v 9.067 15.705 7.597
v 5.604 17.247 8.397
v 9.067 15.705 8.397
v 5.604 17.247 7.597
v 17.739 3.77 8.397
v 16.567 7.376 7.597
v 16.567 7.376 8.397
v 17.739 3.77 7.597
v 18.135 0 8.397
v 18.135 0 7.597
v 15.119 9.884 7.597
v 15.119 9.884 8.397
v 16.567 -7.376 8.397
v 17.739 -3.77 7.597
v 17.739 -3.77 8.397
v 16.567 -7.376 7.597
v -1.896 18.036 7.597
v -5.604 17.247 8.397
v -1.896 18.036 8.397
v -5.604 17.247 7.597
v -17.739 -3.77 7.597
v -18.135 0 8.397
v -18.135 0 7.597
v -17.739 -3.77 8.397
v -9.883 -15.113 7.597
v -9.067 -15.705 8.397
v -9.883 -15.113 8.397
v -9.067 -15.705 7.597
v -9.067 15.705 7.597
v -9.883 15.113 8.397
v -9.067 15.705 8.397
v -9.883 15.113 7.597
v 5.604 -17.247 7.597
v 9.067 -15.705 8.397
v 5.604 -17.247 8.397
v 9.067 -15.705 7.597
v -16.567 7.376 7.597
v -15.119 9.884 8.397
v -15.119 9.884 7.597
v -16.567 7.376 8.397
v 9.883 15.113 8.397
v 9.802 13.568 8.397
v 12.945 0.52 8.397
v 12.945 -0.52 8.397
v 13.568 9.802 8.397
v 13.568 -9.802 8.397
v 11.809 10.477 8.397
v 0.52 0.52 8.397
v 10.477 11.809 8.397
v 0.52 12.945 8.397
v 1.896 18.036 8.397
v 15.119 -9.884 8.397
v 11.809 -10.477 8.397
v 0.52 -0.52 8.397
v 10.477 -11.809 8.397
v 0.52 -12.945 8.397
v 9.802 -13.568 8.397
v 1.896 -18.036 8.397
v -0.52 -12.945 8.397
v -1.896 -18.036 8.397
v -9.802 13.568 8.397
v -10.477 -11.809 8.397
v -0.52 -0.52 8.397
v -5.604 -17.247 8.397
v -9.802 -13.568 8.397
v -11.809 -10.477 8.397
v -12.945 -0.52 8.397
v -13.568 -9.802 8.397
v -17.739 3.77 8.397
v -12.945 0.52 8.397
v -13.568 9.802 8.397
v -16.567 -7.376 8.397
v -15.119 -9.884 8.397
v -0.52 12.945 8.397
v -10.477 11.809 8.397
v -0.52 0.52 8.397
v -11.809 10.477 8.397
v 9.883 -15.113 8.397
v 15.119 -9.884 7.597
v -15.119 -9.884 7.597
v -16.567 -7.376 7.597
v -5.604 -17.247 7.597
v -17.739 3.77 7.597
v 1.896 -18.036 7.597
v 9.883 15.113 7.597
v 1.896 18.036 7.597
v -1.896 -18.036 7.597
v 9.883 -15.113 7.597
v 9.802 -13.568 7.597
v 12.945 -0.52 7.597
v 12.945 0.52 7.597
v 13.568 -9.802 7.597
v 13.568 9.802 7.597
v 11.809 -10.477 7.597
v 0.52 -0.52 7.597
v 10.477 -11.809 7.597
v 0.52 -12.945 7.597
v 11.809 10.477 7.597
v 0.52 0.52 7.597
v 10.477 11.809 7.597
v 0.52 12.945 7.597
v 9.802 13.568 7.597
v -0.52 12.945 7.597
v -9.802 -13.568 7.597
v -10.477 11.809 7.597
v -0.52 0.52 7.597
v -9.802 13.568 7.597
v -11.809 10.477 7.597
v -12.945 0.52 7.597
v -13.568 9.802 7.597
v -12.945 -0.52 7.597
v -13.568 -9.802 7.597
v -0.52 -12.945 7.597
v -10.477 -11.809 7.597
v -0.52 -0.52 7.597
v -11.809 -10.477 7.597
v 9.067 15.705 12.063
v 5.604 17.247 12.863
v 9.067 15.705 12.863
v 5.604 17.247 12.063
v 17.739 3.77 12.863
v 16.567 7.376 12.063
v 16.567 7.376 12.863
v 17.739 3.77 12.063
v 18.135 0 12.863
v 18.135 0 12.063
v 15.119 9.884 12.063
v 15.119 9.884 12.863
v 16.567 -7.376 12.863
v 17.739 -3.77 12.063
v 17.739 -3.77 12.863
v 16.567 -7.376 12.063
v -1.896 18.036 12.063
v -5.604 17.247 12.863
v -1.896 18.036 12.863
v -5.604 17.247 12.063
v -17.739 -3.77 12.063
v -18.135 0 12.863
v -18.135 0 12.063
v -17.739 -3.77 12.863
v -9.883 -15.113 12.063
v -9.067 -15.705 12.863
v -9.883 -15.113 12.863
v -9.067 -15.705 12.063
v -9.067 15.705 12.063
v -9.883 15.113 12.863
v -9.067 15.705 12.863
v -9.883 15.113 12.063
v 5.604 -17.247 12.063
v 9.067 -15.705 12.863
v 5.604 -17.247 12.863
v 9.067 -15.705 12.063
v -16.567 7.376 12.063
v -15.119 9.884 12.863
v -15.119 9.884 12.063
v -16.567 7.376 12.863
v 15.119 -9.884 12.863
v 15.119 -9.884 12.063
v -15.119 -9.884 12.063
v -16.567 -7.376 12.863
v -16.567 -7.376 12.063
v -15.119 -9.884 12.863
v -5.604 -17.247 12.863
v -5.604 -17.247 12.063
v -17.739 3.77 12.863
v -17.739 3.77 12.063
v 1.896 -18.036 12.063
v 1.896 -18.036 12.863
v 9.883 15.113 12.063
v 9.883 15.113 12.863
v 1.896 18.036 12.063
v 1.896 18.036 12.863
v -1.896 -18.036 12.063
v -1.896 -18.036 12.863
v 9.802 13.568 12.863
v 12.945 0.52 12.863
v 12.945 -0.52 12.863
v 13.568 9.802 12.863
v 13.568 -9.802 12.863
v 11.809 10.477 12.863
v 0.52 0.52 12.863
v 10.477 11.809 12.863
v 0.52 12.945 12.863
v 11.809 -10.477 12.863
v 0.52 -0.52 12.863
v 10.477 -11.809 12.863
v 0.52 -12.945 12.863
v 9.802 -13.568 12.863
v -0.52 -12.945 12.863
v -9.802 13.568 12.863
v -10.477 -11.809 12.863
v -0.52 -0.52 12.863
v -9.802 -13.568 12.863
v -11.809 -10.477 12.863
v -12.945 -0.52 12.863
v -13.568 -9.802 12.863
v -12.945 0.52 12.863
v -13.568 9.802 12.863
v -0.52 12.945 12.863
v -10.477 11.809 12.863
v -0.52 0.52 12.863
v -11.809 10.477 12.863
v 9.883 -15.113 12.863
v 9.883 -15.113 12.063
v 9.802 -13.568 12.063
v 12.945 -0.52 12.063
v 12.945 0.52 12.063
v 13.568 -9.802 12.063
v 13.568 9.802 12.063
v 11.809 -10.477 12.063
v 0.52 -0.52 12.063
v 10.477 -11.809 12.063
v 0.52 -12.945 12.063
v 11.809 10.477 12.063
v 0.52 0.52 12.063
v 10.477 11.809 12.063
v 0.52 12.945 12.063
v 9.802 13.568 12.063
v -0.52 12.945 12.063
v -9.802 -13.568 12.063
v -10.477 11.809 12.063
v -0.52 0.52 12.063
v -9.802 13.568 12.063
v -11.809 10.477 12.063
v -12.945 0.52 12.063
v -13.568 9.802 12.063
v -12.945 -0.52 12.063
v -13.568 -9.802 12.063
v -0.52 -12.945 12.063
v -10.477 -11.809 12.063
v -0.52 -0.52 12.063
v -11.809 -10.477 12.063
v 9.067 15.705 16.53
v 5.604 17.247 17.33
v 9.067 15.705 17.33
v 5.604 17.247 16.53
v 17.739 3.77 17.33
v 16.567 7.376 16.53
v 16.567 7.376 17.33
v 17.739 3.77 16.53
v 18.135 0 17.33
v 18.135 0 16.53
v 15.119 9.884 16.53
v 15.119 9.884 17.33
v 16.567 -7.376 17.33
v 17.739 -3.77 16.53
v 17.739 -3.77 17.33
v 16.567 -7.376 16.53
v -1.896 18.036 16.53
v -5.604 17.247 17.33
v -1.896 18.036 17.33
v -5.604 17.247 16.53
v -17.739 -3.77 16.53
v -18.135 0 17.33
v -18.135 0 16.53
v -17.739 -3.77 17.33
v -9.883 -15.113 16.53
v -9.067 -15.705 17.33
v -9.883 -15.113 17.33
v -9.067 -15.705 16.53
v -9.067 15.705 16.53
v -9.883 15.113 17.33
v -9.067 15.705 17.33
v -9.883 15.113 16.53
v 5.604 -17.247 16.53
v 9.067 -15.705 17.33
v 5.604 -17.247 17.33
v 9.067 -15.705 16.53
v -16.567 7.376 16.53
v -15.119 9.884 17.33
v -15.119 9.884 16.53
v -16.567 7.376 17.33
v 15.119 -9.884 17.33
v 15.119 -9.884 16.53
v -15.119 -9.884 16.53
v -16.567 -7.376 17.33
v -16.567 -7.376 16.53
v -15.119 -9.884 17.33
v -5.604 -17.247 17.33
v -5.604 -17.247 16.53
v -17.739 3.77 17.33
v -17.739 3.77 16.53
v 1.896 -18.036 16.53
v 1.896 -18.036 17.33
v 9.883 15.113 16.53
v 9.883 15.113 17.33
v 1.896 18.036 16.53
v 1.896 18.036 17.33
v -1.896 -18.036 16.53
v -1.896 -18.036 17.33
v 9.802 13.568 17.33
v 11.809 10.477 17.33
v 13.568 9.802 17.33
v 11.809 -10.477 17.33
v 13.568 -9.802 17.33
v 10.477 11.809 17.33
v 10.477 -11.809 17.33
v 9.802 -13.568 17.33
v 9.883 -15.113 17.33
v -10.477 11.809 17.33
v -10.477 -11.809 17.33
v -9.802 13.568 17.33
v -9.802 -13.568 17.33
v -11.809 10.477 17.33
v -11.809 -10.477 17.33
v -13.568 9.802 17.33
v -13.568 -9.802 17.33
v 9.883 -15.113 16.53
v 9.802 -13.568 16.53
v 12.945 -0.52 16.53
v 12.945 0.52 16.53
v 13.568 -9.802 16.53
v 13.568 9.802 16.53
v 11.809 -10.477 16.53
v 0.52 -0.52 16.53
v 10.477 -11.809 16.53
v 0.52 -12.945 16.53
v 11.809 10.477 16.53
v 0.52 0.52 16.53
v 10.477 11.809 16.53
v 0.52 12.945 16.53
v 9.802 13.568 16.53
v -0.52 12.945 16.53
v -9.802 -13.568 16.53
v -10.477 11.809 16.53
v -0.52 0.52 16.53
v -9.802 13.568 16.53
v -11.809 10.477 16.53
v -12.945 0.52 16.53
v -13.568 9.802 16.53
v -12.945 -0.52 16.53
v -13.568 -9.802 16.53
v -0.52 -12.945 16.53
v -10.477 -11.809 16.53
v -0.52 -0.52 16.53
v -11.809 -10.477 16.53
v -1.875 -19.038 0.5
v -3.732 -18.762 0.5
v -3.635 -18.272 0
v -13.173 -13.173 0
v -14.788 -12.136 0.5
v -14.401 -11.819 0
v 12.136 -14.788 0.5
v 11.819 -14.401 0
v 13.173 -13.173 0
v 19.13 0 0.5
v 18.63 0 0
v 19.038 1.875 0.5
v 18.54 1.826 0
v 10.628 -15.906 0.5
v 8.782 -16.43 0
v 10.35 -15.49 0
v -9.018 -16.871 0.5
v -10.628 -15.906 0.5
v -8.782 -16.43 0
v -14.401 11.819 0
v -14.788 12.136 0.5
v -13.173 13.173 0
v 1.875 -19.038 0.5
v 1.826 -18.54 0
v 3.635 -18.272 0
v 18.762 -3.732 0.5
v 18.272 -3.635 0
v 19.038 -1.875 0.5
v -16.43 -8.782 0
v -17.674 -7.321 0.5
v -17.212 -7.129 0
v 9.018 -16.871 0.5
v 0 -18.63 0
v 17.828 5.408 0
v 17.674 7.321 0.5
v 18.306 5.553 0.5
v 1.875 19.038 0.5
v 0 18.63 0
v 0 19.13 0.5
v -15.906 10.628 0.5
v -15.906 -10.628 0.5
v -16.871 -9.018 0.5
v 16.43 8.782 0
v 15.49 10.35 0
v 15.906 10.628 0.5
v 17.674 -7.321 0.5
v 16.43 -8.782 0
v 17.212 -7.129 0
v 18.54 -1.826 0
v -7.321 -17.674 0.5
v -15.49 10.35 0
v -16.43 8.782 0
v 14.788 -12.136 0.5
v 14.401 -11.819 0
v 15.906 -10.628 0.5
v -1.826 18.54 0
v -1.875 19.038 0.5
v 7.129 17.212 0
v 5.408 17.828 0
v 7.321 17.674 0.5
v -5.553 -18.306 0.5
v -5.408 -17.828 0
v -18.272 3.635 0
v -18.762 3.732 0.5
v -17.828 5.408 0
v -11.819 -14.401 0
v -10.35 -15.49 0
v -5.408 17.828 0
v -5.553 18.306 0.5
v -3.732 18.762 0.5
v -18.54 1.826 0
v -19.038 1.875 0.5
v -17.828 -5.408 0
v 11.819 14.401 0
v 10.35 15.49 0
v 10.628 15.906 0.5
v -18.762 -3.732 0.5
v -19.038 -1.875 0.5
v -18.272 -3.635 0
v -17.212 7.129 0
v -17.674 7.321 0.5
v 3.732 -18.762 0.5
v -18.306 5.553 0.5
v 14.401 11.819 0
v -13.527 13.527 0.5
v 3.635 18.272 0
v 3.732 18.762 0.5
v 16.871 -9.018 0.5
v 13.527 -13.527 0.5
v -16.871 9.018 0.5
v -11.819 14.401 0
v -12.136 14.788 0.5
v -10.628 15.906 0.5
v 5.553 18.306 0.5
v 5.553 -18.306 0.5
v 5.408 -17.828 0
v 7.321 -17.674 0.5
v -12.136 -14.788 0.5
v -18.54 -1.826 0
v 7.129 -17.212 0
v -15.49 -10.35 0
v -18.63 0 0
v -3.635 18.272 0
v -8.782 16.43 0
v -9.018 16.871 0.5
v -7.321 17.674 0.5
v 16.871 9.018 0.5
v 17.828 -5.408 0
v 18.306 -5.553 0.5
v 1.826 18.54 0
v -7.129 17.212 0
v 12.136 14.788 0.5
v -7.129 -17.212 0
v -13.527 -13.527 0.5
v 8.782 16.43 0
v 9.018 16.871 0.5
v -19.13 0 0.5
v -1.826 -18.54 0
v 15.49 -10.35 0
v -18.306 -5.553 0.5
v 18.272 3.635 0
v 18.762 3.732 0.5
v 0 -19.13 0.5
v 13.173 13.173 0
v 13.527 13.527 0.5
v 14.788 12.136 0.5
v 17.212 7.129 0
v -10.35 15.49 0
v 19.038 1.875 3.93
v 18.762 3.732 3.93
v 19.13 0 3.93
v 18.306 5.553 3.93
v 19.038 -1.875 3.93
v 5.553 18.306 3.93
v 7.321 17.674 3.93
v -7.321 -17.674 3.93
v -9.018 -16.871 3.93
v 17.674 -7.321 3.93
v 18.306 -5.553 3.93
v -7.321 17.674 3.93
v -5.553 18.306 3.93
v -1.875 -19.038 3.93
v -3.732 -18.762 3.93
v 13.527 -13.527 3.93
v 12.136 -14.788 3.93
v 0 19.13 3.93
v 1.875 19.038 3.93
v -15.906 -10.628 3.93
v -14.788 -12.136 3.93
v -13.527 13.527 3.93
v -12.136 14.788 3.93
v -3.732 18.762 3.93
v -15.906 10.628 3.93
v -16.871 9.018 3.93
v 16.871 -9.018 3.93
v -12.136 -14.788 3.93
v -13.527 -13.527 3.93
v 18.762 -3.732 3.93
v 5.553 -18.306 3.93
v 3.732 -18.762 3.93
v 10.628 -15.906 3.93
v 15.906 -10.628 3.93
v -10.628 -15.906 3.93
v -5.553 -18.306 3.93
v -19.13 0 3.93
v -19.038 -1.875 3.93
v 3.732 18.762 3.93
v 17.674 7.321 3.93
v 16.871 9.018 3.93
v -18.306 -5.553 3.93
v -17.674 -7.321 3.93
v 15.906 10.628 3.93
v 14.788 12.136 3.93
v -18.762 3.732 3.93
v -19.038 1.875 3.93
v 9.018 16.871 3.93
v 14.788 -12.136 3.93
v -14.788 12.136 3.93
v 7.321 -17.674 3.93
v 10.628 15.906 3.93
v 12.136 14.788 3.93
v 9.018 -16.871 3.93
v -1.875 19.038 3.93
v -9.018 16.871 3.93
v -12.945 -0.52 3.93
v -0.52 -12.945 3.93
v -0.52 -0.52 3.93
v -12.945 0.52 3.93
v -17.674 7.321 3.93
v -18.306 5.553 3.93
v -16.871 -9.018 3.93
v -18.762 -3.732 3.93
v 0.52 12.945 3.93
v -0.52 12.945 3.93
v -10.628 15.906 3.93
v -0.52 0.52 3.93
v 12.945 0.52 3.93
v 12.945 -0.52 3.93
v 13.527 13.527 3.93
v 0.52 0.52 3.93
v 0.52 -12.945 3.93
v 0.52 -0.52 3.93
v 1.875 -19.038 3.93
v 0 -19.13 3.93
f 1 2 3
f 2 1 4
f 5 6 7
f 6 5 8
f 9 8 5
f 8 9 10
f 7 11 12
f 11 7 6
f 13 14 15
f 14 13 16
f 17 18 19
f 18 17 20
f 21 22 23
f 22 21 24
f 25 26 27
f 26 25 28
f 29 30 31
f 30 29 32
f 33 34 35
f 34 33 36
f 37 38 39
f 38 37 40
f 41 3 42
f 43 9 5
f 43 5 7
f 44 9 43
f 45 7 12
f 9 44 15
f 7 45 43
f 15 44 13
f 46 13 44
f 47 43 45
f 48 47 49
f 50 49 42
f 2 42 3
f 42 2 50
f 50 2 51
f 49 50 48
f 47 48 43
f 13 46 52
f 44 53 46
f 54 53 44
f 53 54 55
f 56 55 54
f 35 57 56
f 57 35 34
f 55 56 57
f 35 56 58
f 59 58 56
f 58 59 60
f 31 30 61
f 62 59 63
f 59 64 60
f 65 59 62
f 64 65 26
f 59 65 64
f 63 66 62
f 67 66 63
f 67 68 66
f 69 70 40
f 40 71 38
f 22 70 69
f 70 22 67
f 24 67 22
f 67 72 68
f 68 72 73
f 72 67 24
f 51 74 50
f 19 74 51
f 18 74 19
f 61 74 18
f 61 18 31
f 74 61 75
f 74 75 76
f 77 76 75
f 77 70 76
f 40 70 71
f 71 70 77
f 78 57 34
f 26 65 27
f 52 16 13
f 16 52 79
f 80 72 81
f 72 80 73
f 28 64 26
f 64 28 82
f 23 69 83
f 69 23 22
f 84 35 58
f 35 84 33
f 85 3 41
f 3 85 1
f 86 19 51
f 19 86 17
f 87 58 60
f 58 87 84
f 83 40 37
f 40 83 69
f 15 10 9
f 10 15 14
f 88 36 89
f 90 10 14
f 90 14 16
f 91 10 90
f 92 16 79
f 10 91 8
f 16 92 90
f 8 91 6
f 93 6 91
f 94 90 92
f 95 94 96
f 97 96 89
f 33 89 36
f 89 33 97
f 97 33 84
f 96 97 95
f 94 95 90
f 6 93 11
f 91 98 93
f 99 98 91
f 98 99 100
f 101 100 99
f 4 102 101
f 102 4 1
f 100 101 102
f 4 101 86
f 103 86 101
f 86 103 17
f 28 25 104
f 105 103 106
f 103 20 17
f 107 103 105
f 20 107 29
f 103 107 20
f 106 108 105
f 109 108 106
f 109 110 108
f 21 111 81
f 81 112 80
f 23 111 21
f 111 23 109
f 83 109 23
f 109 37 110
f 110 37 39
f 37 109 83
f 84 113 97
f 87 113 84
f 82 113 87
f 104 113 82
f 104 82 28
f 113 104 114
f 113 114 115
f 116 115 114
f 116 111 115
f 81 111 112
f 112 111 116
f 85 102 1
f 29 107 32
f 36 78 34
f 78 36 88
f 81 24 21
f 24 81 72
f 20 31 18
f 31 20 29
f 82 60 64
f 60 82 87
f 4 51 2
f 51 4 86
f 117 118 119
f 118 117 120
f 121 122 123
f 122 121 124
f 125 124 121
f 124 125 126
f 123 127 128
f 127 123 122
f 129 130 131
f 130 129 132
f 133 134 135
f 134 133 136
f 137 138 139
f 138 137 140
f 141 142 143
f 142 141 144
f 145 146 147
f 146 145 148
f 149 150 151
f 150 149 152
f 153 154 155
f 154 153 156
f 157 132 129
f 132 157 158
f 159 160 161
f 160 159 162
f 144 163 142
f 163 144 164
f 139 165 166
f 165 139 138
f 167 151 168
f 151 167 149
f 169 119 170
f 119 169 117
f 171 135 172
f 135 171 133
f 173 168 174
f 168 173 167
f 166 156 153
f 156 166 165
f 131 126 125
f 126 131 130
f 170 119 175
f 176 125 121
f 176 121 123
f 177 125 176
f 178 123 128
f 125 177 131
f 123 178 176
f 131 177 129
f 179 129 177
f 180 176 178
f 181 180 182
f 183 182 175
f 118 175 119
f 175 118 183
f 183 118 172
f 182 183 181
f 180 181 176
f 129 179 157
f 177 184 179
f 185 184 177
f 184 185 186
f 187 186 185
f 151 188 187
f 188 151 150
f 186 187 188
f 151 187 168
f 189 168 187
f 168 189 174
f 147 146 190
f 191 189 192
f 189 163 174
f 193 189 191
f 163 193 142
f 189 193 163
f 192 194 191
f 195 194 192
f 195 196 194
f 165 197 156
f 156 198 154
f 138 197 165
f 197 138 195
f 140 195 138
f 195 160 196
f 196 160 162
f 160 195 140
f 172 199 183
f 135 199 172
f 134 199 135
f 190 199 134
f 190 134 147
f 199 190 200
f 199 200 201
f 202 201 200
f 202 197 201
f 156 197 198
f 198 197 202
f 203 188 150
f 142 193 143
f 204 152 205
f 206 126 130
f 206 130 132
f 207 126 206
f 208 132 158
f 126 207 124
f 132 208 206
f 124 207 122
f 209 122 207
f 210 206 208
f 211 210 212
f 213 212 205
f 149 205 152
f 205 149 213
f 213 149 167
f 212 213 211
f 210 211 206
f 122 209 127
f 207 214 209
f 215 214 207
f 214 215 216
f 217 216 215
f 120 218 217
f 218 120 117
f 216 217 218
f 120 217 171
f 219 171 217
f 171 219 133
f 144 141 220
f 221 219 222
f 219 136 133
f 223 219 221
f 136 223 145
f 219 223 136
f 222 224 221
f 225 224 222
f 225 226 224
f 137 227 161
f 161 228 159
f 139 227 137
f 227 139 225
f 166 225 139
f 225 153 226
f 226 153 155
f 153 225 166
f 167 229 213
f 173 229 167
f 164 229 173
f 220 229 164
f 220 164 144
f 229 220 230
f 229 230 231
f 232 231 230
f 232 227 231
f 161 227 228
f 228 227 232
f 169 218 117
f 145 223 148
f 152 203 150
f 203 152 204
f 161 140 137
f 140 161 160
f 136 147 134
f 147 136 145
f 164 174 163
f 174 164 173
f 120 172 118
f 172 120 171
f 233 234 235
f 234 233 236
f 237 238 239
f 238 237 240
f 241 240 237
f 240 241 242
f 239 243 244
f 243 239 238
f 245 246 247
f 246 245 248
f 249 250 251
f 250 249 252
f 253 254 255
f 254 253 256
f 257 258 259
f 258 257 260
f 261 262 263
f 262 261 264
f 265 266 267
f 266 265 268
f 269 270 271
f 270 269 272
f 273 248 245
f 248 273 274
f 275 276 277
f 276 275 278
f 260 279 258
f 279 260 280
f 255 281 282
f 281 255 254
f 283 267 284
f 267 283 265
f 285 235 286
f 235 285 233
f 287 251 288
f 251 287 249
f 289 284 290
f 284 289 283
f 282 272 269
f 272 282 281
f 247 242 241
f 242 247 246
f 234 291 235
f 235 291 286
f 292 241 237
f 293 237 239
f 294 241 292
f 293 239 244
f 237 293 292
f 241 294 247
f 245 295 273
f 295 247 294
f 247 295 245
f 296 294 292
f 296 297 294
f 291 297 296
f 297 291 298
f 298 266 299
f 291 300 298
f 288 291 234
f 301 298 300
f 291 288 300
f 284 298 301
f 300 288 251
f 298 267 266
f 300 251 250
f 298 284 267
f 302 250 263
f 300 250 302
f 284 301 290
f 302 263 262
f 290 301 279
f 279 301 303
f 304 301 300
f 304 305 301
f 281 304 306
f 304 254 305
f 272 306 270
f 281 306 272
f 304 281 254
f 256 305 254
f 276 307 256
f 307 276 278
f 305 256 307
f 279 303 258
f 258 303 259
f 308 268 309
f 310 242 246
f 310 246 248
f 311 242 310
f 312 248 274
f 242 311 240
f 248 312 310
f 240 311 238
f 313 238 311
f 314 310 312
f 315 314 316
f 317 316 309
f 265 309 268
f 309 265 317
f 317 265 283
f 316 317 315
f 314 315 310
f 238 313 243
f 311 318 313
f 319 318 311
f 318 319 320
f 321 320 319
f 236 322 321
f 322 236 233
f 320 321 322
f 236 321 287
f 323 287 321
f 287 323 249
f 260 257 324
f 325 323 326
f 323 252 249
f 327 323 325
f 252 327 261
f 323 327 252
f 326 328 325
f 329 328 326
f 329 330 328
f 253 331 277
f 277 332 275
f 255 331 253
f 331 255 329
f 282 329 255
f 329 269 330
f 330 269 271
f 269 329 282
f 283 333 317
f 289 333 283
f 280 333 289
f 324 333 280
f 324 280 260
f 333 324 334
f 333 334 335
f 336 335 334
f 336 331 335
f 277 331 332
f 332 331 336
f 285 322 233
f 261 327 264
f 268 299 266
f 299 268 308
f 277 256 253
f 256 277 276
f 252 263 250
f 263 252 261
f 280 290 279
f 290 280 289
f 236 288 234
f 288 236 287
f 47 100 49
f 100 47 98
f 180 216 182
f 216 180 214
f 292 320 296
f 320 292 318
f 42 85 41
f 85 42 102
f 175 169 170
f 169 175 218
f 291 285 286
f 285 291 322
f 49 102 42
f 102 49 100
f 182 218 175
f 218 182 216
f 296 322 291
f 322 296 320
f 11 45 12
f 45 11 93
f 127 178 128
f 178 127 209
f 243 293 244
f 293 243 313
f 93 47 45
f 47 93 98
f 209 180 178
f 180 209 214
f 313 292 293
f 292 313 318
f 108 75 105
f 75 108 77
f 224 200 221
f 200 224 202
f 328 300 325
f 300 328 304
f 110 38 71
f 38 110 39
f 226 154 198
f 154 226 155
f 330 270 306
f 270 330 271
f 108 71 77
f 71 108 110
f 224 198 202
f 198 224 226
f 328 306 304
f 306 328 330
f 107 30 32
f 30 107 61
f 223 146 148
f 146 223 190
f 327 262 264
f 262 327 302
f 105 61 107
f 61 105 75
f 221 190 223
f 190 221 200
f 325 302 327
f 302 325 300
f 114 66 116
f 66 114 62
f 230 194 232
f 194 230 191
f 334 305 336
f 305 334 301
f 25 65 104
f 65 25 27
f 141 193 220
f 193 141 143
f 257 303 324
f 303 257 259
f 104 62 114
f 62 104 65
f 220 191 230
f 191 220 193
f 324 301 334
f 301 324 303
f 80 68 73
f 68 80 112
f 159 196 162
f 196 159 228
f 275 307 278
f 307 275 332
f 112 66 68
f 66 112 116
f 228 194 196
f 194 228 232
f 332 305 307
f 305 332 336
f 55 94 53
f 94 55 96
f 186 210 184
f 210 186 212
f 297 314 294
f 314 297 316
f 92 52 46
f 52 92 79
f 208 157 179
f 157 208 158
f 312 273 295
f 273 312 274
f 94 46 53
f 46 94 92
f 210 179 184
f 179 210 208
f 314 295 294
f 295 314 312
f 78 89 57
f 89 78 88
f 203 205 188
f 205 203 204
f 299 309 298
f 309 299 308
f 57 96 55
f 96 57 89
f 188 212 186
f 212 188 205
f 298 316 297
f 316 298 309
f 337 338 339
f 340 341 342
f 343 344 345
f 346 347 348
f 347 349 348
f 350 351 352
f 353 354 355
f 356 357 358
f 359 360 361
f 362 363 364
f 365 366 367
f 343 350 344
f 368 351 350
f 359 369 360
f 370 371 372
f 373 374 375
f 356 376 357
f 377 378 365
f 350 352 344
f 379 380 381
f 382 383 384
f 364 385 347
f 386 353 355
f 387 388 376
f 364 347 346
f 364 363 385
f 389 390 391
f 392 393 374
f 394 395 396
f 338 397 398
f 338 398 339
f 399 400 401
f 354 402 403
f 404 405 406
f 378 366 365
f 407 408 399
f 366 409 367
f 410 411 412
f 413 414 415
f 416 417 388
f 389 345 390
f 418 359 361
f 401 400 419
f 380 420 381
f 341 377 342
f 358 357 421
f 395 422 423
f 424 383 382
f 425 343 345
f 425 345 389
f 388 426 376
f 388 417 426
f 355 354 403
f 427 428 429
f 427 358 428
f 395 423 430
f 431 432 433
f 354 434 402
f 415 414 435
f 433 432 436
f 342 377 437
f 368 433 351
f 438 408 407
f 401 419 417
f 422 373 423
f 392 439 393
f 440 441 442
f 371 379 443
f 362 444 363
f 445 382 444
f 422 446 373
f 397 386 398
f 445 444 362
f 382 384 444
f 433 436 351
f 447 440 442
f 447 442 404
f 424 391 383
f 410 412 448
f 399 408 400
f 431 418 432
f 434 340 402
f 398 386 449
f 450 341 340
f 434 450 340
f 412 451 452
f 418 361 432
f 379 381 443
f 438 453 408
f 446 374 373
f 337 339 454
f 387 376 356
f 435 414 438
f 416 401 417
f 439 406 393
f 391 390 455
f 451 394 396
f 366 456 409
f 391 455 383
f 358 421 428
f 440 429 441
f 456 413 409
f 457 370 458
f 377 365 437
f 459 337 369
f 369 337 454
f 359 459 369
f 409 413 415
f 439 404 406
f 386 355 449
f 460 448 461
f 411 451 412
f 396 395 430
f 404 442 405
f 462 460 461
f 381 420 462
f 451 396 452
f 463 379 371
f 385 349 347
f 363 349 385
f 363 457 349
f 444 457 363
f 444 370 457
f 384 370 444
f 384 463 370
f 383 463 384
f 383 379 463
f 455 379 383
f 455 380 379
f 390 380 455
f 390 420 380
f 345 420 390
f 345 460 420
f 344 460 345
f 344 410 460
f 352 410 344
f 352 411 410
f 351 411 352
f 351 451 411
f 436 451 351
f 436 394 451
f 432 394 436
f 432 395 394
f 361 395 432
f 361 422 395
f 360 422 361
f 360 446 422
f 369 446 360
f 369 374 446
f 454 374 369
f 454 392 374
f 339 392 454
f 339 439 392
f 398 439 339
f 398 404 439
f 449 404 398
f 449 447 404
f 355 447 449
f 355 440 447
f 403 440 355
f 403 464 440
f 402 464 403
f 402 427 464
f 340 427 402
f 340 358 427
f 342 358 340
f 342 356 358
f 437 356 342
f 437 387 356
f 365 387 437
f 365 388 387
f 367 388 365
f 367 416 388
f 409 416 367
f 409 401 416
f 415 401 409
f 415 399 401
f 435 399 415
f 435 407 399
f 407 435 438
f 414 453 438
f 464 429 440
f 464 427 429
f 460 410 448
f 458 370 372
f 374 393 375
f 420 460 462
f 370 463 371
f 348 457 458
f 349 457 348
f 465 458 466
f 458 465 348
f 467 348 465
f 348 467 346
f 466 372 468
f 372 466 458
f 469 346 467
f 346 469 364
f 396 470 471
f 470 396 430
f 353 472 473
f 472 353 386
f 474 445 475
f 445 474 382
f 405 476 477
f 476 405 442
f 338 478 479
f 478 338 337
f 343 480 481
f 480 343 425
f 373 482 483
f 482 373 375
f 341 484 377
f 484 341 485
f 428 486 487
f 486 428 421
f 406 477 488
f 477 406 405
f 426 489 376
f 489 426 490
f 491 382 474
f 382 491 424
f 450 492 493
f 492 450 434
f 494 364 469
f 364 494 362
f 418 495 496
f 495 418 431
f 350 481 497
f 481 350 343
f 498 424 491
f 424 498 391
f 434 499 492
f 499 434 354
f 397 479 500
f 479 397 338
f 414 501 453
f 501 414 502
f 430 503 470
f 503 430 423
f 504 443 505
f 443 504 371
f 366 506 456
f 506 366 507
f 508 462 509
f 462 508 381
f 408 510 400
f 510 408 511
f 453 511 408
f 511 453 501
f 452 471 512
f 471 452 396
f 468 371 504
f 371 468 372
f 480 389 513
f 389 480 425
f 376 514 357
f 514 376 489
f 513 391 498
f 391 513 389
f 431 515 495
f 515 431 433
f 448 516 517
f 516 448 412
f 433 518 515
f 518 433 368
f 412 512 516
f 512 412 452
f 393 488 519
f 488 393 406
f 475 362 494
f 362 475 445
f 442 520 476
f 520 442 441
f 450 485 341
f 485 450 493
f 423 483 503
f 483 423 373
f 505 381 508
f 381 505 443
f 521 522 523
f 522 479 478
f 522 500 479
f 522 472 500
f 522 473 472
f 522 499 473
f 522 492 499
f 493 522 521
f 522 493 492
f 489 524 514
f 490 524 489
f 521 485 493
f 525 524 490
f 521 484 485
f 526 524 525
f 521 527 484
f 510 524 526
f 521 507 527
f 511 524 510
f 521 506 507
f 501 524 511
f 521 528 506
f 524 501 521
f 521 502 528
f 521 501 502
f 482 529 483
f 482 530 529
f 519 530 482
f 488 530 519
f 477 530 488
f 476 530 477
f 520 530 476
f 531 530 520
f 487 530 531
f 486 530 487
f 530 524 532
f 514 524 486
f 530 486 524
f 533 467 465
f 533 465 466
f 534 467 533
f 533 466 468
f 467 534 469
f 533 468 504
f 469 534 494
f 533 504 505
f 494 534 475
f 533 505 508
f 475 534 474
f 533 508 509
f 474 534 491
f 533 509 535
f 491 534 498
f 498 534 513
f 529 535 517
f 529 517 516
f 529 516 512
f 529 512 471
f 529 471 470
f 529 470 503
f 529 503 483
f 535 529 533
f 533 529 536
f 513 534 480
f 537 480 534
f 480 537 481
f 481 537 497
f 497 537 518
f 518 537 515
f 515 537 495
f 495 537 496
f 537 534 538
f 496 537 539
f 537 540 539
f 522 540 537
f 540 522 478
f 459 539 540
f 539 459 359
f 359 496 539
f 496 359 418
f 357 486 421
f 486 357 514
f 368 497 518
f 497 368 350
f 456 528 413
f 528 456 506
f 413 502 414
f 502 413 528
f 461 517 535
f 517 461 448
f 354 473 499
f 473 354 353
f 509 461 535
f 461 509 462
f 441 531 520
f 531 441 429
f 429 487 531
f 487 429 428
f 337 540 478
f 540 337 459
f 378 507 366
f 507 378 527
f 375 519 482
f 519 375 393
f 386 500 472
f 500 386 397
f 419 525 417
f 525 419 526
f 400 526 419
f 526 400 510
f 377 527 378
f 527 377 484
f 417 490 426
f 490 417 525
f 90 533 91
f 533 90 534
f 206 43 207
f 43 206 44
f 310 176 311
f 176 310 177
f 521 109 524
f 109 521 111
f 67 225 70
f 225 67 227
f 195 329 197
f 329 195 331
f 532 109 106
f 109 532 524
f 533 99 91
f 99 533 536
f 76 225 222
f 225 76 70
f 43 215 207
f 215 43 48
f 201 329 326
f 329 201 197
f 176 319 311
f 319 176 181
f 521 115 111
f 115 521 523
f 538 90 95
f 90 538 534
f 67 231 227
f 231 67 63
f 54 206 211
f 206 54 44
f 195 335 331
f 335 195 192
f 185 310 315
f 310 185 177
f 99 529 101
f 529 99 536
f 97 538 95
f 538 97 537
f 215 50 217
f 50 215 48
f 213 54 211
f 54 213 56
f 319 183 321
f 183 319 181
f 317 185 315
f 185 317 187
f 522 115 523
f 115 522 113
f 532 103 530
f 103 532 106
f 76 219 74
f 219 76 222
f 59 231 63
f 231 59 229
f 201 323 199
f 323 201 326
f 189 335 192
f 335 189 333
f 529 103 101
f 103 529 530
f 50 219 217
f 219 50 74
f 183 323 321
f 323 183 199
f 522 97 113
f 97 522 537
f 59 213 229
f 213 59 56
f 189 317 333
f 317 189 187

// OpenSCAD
/* [MAIN] */

// outside diameter of the pipe
od=38.26;

// This is the diameter of the fins.  Make this sligtly larger than the inside diameter of the pipe
fin_dia=36.27;

// How thick the fin layers are.
layer_thickness=0.8;

// The number of fin layers
num_layers=3;

// The height of the entire foot INCLUDING the part that goes inside the pipe.
total_h=17.33;

// The height of the bottom pad of the foot
pad_h=3.93;

// Diameter of the x-shaped center support
x_dia=25.89;

// Thickness of the x-shaped center support
x_thick=1.04;

// Diameter of the circular cutouts
circ_dia=9.06;

// How many circular cutouts
num_circ=4;

// How far from the center to the edge of the circular cutouts
center_to_circ_edge=15.66;

// How big a bevel to add to the bottom of the foot
bevel_h=0.5;

// if true, will cut in half and flip sideways for printing
printable=0; // [0:false,1:true]

module foot(){
	// calc
	layers_h=total_h-pad_h;
	layer_spacing=layers_h/(num_layers+0);

	// pad
	cylinder(r2=od/2,r1=od/2-bevel_h,h=bevel_h,$fn=64);
	translate([0,0,bevel_h]) cylinder(r=od/2,h=pad_h-bevel_h,$fn=64);
	// layers
	difference(){
		union(){
			// layers
			for(z=[pad_h+layer_spacing-layer_thickness:layer_spacing:total_h]){
				translate([0,0,z]) cylinder(r=fin_dia/2,h=layer_thickness);
			}
		}
		for(a=[0:360/num_circ:359.99]){
			rotate([0,0,a+45]) translate([center_to_circ_edge+circ_dia/2,0,pad_h]) cylinder(r=circ_dia/2,h=total_h);
		}
	}
	// x
	translate([-x_dia/2,-x_thick/2,0]) cube([x_dia,x_thick,total_h]);
	translate([-x_thick/2,-x_dia/2,0]) cube([x_thick,x_dia,total_h]);
}
	
if(printable==1){
	difference(){
		union(){
			translate([1,0,0]) rotate([0,90,0]) foot();
			translate([-1,0,0]) rotate([0,-90,0]) foot();
		}
		translate([-total_h*1.5,-od,-od]) cube([total_h*3,od*2,od]);
	}
}else{
	foot();
}
